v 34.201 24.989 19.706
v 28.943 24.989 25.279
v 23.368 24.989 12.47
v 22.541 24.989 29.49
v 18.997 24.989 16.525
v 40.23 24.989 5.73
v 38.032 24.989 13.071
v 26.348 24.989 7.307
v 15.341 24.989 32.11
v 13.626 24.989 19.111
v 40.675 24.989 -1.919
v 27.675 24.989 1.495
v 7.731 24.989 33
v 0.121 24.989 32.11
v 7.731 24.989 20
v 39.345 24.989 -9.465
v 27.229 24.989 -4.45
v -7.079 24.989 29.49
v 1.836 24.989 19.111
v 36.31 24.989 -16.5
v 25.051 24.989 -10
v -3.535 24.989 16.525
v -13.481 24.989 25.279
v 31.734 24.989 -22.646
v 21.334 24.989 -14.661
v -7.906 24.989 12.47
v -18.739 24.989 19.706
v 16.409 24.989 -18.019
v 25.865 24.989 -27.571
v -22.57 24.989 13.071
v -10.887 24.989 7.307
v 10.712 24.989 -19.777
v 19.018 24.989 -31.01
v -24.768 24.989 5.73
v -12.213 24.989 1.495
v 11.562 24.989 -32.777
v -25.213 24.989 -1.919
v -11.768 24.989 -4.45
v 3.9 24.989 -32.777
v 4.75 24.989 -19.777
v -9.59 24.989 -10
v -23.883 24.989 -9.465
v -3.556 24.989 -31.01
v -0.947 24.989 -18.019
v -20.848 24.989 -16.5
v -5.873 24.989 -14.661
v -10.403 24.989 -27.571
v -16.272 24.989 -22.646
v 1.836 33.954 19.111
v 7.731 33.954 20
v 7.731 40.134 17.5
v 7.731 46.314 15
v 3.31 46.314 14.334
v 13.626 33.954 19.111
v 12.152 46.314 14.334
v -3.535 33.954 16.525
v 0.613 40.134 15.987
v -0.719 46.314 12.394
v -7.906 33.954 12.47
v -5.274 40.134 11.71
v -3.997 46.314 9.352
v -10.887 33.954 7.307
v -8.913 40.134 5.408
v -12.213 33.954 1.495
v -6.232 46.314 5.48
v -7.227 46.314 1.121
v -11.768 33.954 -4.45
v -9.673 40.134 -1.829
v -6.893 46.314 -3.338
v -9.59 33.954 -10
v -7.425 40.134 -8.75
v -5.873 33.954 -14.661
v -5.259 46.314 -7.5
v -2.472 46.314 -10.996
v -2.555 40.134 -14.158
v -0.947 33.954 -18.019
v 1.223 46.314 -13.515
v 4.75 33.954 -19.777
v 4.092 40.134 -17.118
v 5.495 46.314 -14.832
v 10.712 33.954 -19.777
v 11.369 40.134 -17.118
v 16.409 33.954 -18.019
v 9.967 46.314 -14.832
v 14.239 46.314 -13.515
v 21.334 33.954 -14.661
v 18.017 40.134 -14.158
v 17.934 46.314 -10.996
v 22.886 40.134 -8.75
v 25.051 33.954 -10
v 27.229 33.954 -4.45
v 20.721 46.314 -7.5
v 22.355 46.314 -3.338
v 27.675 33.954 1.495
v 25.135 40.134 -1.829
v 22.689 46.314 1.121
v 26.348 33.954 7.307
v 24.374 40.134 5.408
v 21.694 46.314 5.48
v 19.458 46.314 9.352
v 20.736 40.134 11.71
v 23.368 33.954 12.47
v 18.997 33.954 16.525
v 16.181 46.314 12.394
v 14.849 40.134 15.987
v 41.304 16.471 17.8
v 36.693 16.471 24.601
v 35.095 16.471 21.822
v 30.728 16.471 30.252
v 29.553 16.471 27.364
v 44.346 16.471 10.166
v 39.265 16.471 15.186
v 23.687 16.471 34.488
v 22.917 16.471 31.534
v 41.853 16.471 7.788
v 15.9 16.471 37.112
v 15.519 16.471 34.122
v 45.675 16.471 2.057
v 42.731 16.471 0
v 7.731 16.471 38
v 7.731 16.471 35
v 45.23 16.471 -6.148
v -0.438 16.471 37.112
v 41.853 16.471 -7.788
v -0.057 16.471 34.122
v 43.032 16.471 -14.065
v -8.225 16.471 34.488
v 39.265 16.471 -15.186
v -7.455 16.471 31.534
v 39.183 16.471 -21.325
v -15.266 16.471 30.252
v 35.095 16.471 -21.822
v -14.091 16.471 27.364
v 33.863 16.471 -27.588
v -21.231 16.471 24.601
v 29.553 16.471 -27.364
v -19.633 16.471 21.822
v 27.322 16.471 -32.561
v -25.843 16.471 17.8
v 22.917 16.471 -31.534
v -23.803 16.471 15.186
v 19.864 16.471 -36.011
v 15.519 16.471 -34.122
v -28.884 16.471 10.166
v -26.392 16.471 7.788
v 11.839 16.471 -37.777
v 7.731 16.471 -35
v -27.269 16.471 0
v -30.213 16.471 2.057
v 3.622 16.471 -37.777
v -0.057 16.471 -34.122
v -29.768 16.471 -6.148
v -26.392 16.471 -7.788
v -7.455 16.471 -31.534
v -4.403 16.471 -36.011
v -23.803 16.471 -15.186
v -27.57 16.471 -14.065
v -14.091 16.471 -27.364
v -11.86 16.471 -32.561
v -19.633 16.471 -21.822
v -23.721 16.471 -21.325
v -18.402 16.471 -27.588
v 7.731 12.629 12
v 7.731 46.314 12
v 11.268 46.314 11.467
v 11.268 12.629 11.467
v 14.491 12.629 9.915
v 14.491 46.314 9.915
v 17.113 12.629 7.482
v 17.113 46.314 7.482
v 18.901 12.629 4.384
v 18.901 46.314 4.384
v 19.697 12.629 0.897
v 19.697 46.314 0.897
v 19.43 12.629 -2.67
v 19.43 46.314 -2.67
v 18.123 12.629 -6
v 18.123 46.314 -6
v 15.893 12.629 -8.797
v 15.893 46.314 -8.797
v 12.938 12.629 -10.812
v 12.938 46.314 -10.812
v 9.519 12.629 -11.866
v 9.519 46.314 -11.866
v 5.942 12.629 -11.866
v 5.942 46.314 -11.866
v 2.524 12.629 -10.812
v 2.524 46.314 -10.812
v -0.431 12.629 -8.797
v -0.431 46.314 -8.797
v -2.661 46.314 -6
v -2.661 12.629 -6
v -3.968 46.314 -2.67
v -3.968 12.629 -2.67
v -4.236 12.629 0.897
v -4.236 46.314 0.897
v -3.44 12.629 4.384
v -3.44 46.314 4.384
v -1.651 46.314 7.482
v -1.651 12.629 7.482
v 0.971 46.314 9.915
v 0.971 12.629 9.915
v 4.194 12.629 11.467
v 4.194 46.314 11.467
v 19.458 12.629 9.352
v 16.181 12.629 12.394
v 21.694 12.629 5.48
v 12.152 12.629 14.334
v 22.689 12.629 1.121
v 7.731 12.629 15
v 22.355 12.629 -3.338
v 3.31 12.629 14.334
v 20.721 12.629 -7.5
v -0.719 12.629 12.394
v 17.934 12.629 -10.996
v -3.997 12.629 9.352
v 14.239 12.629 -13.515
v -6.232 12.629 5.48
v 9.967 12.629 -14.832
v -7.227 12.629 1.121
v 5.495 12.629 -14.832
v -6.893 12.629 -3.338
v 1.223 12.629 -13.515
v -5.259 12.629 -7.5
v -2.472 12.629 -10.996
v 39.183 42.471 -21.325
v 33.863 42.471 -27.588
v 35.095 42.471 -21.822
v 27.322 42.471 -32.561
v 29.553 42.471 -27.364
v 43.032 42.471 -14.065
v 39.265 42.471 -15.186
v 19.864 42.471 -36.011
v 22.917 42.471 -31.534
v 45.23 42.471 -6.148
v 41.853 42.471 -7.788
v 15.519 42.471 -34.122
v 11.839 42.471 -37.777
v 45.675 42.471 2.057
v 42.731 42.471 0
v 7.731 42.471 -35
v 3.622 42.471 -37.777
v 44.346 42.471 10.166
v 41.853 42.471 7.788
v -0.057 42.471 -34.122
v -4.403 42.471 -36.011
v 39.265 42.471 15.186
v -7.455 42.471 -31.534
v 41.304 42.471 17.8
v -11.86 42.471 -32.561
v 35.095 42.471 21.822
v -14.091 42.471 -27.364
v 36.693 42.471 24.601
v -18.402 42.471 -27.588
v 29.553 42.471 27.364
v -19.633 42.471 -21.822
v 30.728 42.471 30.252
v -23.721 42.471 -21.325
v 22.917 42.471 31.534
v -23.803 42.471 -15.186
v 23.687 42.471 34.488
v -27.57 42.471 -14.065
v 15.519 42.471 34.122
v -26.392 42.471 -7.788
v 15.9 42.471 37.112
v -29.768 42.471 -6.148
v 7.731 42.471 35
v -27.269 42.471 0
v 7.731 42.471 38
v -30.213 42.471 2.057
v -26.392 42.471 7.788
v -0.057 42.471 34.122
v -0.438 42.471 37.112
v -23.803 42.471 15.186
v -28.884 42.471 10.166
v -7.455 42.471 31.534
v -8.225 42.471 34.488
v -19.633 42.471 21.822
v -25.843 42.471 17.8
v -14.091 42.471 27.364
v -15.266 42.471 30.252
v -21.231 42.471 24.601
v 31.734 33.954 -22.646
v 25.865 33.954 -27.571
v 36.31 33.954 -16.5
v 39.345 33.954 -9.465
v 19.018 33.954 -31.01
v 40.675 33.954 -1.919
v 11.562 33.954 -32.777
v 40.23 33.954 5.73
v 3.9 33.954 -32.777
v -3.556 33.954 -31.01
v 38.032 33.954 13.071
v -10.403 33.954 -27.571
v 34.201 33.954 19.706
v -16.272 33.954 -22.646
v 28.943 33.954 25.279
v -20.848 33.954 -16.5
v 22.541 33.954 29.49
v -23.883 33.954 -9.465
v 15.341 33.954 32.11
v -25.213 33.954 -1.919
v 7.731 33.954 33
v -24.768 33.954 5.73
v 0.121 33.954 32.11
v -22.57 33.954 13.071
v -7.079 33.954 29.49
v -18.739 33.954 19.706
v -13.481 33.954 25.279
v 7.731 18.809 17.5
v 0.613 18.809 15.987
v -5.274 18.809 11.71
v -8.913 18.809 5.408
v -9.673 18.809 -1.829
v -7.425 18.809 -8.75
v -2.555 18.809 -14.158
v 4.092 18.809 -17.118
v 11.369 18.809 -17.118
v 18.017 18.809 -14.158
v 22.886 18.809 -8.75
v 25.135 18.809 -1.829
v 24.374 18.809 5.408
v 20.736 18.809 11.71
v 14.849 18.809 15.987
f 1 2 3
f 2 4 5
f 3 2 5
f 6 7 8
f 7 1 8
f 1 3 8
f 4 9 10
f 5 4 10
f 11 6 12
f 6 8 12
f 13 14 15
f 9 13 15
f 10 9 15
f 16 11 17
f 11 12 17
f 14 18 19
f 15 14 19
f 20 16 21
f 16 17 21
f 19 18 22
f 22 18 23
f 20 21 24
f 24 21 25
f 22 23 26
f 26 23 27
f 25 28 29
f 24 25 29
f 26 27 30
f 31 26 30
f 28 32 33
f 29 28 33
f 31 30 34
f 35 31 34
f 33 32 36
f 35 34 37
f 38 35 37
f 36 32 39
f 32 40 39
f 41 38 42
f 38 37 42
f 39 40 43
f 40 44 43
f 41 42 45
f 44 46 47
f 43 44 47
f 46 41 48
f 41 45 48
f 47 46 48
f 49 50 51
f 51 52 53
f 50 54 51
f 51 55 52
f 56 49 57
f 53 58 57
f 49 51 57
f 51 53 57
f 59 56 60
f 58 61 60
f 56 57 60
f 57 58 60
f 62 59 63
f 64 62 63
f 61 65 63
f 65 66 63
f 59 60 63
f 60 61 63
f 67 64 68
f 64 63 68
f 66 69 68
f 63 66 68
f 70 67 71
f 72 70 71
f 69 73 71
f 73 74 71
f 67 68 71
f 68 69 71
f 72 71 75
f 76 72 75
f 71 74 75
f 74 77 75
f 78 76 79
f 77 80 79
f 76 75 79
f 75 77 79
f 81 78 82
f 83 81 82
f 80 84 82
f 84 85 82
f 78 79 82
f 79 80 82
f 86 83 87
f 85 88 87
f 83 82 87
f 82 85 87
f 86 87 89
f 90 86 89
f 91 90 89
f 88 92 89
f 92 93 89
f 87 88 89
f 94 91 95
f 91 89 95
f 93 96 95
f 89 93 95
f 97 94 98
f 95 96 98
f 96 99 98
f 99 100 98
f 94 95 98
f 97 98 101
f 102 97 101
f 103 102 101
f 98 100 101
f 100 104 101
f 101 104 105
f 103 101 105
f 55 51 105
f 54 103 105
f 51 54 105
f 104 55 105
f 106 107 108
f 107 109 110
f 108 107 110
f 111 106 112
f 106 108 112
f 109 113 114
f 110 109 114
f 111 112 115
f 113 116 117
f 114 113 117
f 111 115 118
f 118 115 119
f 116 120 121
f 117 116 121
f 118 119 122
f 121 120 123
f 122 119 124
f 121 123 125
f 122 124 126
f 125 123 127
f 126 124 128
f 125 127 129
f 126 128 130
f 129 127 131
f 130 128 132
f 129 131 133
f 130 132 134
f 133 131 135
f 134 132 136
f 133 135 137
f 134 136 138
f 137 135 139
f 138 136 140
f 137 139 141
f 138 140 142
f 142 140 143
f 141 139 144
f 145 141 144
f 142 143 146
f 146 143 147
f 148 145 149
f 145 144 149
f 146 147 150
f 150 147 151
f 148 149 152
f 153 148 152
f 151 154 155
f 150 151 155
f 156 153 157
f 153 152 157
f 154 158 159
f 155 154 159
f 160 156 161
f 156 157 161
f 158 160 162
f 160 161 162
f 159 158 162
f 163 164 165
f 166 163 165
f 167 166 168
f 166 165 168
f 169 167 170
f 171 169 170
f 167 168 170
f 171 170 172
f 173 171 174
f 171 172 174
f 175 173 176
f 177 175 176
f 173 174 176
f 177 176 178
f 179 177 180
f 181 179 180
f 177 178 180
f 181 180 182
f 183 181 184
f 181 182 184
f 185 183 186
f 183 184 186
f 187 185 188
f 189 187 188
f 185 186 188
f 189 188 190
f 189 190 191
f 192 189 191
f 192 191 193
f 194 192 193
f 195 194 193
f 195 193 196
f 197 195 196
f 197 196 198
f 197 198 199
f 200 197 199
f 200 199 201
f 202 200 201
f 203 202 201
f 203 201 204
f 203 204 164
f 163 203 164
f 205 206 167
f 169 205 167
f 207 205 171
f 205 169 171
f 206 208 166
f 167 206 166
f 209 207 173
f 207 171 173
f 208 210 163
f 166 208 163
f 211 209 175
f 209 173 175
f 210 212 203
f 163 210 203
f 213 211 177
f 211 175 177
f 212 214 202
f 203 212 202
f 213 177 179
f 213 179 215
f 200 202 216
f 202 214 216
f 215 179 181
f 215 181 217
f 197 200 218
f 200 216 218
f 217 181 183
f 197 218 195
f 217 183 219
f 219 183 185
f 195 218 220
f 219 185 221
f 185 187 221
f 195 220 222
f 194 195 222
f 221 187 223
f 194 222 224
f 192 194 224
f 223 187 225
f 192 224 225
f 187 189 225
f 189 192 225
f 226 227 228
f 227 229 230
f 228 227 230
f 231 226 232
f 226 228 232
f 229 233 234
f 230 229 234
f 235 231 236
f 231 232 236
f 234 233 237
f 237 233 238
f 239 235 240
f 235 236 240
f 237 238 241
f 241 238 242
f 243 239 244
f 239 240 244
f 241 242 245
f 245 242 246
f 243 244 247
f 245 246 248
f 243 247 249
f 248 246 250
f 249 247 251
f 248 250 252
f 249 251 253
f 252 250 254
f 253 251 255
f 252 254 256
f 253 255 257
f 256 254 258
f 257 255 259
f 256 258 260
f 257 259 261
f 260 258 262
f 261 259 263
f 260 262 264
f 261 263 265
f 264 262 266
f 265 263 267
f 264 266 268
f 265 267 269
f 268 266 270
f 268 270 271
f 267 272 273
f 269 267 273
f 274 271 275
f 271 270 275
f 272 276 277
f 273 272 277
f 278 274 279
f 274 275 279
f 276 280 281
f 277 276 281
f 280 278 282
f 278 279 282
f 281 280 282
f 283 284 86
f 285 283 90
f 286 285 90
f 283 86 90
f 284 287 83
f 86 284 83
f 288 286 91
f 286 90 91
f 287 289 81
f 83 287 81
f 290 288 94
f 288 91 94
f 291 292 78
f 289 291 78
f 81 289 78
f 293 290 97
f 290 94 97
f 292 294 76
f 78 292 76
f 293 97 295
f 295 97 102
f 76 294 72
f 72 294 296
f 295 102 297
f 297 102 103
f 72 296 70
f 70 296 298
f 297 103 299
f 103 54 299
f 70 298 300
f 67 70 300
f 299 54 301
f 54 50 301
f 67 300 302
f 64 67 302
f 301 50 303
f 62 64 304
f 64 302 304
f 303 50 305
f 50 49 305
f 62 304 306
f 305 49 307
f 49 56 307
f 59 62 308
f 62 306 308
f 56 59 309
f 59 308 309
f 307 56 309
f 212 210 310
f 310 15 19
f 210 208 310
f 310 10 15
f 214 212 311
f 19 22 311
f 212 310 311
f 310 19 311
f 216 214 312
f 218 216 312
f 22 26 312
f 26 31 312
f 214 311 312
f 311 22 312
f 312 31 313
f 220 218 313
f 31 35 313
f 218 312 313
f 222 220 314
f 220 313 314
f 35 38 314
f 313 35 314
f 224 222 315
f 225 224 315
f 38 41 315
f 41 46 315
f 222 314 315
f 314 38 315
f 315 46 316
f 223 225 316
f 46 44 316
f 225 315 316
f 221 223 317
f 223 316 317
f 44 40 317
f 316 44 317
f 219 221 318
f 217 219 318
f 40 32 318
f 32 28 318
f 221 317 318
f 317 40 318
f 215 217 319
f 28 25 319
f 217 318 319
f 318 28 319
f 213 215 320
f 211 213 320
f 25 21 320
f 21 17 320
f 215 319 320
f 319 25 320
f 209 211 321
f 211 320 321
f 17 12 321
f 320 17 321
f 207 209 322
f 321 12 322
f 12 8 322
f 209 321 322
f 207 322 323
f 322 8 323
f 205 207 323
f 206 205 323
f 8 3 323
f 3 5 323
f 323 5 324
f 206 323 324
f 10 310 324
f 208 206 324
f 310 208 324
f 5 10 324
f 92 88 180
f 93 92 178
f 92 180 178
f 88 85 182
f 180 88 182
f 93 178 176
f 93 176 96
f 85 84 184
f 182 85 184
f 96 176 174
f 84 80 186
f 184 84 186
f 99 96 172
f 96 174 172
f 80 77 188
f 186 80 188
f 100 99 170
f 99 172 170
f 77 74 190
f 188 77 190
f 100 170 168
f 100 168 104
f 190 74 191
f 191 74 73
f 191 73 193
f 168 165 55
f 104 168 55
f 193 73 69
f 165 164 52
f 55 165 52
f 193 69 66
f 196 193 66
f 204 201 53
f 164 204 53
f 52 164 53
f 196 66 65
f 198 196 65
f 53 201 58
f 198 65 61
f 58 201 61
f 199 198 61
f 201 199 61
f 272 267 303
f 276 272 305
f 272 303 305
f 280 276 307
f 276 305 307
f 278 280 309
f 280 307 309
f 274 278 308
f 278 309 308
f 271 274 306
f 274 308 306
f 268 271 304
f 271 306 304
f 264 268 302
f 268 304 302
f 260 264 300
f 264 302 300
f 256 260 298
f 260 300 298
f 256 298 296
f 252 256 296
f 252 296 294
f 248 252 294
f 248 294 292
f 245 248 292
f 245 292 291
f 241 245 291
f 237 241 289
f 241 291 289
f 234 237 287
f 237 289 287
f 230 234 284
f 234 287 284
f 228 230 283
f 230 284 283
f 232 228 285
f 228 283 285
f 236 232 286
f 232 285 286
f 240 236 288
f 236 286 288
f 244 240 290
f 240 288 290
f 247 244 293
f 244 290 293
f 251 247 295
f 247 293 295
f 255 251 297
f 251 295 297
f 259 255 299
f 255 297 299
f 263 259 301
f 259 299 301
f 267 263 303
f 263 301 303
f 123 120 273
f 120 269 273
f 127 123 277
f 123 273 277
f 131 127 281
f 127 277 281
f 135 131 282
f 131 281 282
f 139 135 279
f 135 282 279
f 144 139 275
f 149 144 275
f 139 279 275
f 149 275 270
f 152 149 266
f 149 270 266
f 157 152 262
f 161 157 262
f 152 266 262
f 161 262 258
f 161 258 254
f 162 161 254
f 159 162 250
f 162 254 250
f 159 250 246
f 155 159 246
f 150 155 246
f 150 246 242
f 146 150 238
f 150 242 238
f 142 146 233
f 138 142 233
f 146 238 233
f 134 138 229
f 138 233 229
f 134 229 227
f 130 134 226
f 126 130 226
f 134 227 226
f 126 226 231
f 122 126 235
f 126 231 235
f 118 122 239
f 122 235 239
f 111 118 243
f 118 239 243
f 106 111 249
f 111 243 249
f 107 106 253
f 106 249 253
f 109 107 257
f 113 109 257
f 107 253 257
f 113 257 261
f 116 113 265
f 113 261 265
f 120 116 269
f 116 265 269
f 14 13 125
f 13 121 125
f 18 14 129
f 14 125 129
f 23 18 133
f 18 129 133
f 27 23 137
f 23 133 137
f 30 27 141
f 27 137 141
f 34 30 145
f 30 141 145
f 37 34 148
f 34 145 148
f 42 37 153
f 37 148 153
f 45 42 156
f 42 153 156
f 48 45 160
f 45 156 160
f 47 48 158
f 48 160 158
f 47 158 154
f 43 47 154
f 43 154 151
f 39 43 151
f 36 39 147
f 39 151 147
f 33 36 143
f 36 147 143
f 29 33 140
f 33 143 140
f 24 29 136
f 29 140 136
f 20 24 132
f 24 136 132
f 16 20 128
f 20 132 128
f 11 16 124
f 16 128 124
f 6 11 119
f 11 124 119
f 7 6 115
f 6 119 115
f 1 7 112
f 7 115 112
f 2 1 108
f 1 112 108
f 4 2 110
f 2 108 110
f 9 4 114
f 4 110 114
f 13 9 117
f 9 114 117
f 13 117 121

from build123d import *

# Parameters (mm, degrees)
CORTAR_EXTRUIR1_REACH = 70.338
CROQUIS2_R            = 12


with BuildPart() as part:
    # Croquis1 → Revolución1 (revolve)
    with BuildSketch(Plane.XY, mode=Mode.PRIVATE) as revoluci_n1_sk:
        Polygon((7.730917784, 46.314331723), (7.730917784, 12.628663446), (22.730917784, 12.628663446), (27.730917784, 24.989291465), (40.730917784, 24.989291465), (42.730917784, 16.471497585), (45.730917784, 16.471497585), (45.730917784, 42.471497585), (42.730917784, 42.471497585), (40.730917784, 33.953703704), (27.730917784, 33.953703704), (22.730917784, 46.314331723), align=None)
    revolve(revoluci_n1_sk.sketch.rotate(Axis((7.730917784, 46.314331723, 0), (0, -1, 0)), 90), axis=Axis((7.730917784, 46.314331723, 0), (0, -1, 0)))

    # Croquis2 → Cortar-Extruir1 (cut, up to next)
    with BuildSketch(Plane(origin=(0, 46.314331723, 0), x_dir=(1, 0, 0), z_dir=(0, 1, 0)), mode=Mode.PRIVATE) as cortar_extruir1_sk1:
        with Locations(Location((7.730917784, 0, 0), (0, 0, 270))):
            Circle(CROQUIS2_R)
    cortar_extruir1_tool1 = extrude(cortar_extruir1_sk1.sketch, amount=-CORTAR_EXTRUIR1_REACH, mode=Mode.PRIVATE) & part.part
    add(cortar_extruir1_tool1.solids().sort_by_distance((7.730918, 46.314332, 0))[0], mode=Mode.SUBTRACT)


solid = part.part
